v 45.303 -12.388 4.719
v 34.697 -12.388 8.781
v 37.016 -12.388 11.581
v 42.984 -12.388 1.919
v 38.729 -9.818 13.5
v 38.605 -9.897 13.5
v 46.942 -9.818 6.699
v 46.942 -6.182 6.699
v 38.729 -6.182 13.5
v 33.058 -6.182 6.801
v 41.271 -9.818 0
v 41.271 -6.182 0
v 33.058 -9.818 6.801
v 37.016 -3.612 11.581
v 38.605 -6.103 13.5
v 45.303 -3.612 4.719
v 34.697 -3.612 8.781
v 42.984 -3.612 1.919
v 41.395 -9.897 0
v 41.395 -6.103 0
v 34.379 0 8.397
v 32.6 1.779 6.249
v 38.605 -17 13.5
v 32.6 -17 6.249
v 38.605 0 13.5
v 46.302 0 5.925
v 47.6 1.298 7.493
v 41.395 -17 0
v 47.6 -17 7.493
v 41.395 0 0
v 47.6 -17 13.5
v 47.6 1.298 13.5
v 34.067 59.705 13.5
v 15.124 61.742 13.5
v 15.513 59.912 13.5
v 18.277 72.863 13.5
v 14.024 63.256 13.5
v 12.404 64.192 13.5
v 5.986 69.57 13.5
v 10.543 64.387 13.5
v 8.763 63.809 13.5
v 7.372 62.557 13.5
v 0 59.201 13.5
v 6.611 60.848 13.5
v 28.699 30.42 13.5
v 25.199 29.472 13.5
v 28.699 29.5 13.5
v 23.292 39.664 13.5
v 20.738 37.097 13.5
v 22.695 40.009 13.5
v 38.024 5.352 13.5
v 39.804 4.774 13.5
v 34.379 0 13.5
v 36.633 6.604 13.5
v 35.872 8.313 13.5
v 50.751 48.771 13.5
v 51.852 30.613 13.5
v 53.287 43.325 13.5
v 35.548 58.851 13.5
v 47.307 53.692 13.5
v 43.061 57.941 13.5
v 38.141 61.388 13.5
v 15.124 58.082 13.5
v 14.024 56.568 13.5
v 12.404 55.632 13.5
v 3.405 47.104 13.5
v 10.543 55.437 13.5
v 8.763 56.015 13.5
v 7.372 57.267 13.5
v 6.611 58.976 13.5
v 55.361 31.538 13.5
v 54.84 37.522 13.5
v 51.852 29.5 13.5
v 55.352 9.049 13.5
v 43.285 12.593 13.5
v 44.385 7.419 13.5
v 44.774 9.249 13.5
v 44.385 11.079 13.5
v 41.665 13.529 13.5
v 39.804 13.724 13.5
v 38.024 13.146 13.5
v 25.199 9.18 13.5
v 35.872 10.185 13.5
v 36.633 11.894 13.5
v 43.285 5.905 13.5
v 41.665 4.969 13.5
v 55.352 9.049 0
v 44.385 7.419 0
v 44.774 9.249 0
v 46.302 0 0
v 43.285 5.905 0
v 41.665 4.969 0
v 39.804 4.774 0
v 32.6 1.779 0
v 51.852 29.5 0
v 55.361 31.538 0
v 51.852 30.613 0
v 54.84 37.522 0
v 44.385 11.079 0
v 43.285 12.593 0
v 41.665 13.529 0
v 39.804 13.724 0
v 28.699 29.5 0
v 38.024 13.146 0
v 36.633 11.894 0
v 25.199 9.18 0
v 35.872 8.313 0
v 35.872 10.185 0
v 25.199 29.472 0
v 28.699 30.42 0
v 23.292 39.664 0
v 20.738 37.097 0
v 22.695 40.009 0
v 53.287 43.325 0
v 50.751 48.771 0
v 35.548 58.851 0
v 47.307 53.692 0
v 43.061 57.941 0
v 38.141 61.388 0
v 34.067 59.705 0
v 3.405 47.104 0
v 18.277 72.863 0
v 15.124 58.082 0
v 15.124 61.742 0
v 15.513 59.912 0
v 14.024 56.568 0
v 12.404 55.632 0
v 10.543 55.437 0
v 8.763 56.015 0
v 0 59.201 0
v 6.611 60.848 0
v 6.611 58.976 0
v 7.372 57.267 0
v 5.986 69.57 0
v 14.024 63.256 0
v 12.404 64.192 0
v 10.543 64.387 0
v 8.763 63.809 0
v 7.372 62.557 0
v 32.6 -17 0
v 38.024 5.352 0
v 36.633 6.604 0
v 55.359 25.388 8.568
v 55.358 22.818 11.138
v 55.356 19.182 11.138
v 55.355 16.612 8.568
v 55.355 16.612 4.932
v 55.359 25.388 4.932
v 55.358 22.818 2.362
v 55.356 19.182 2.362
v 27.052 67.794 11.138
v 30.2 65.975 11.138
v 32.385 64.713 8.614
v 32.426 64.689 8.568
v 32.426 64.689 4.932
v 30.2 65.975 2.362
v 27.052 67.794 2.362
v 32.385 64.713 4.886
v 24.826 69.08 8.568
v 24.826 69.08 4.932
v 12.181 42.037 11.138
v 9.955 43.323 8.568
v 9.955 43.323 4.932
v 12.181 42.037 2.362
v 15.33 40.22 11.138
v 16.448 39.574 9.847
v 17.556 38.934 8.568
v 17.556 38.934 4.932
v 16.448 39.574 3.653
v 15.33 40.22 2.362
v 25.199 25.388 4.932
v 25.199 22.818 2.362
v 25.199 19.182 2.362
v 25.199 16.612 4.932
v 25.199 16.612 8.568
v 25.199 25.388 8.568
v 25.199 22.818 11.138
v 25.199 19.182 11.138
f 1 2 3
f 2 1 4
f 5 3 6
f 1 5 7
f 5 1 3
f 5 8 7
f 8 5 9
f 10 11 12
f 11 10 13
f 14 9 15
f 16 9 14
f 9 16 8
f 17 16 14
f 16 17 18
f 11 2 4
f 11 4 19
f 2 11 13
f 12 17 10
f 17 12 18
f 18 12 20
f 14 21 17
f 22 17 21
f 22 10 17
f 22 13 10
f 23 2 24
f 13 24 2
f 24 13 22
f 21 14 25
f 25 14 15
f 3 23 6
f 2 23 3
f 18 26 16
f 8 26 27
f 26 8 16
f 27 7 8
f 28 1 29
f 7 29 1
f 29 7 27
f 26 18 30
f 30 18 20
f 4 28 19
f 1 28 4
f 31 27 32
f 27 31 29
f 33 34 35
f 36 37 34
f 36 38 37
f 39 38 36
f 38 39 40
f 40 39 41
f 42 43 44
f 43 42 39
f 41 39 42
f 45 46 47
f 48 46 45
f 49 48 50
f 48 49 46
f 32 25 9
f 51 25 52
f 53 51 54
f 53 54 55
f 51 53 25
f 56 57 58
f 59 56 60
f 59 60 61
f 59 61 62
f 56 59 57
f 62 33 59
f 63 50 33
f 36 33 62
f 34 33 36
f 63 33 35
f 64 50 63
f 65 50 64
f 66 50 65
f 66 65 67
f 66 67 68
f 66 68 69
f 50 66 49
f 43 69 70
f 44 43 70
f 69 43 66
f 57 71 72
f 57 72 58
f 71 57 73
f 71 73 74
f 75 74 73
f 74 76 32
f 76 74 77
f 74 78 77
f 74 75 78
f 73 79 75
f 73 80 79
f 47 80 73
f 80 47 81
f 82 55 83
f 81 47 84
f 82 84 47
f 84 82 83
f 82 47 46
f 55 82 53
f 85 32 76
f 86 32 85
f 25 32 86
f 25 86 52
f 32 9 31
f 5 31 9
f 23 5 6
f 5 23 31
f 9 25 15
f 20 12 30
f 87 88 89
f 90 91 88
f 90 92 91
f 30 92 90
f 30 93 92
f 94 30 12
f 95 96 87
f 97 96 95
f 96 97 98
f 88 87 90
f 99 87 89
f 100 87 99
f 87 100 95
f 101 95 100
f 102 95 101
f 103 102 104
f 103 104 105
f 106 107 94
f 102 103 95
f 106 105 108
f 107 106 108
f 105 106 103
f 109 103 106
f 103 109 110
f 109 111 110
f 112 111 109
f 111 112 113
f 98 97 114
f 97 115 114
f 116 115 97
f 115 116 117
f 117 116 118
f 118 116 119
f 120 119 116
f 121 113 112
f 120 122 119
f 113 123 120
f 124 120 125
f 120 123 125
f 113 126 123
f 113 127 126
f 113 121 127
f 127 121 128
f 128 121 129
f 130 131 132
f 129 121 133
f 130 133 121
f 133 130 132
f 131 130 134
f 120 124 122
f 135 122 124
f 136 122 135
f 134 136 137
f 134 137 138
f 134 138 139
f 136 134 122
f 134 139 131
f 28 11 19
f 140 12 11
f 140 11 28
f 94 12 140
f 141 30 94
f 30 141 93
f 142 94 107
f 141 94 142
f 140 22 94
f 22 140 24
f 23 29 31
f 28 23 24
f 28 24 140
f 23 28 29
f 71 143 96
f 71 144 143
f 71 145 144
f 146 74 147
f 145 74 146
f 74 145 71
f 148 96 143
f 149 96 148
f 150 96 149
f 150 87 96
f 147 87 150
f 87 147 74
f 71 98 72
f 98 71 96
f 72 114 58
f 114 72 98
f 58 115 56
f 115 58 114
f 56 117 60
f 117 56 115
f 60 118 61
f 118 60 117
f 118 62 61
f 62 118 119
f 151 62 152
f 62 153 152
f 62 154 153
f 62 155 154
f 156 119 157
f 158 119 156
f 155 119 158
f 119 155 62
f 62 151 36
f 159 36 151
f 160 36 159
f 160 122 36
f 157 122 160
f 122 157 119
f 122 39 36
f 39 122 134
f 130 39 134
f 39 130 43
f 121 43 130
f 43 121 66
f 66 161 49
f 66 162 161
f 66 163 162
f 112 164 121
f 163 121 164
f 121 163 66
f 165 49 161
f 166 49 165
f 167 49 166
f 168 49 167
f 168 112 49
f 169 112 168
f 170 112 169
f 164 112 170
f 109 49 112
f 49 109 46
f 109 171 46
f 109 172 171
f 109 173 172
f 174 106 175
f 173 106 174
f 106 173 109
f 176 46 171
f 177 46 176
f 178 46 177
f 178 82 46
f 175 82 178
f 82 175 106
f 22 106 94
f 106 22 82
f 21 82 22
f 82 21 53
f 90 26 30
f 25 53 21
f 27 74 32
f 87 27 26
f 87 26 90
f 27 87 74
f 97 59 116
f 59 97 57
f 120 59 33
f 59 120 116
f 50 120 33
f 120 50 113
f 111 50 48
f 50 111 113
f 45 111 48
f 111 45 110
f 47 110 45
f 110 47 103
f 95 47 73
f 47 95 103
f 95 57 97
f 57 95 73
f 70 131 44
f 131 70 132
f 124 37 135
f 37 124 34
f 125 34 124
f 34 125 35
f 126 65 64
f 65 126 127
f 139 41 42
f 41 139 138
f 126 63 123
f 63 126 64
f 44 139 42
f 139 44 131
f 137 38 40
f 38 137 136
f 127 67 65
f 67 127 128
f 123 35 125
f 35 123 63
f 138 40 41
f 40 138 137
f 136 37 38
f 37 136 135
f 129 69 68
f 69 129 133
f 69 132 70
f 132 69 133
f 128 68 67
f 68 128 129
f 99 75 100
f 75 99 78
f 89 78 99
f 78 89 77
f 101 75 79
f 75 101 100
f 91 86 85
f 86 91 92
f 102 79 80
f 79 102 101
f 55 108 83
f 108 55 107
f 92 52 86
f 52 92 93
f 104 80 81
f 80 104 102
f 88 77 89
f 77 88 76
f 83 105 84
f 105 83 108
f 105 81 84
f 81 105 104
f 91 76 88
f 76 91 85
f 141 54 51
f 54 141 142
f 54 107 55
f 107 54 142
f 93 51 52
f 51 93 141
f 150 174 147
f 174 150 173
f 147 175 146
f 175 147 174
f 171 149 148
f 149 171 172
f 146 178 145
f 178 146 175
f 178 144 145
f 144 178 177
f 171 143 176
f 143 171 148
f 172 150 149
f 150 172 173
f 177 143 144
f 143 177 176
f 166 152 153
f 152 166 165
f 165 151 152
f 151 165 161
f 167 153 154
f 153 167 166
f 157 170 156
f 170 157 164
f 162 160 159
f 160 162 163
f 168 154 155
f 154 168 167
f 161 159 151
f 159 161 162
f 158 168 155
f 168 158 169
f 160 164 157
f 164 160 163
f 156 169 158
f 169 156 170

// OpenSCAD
// file: functions.scad
// PRUSA Mendel  
// Functions used in many files
// GNU GPL v3
// Josef Průša
// josefprusa@me.com
// prusadjs.cz
// http://www.reprap.org/wiki/Prusa_Mendel
// http://github.com/prusajr/PrusaMendel


module nut(d,h,horizontal=true){
cornerdiameter =  (d / 2) / cos (180 / 6);
cylinder(h = h, r = cornerdiameter, $fn = 6);
if(horizontal){
for(i = [1:6]){
	rotate([0,0,60*i]) translate([-cornerdiameter-0.2,0,0]) rotate([0,0,-45]) cube(size = [2,2,h]);
}}
}

// Based on nophead research
module polyhole(d,h) {
    n = max(round(2 * d),3);
    rotate([0,0,180])
        cylinder(h = h, r = (d / 2) / cos (180 / n), $fn = n);
}




module roundcorner(diameter){
	difference(){
		cube(size = [diameter,diameter,99], center = false);
		translate(v = [diameter, diameter, 0]) cylinder(h = 100, r=diameter, center=false,$fn = max(3*diameter,20));
	}
}
// file: configuration.scad
// PRUSA Mendel  
// Configuration file
// GNU GPL v2
// Josef Pra
// josefprusa@me.com
// prusadjs.cz
// http://www.reprap.org/wiki/Prusa_Mendel
// http://github.com/prusajr/PrusaMendel


// PLEASE SELECT ONE OF THE CONFIGURATIONS BELOW
// BY UN-COMMENTING IT


variant=0; //0 for metric
//variant=1; //1 for SAE
if(variant==0){
echo("variant: metric");
}else if(variant==1){
echo("variant: sae");
} else{
echo("WARNING: INVALID CONFIGURATION");
}




vars=[
//[m8_dia,m8_nut, m4_dia, m4_nut, m3_dia, m3_nut, bush_dia, mot_shaft, bush_rod, bush_outerdia, bush_length, m5_dia, m5_nut]
[9, 16.4, 5,9, 4.4, 7, 11, 5.3, 8, 16, 11, 5.6, 10],//metric
[9,15.7,5.5,10.6,5.5,10.6,11.5,5.3,7.9375,16,11,5.6, 10]//SAE
];


//BUSHING TYPE Can generate three versions
// 1 - regular old ones
// 2 - helical ones
// 3 - holders for brass or any other bought bushings
bushing_type = 2;


//Round corner diameter
round_corner_diameter = 8;


//Thin wall size
layer_height = 0.4;
perimeter_width_over_thicknes = 1.6;
infill_widht_over_thickness = 1.55;
thin_wall = 2*(perimeter_width_over_thicknes*layer_height+infill_widht_over_thickness*layer_height);
if(thin_wall<2){
	echo("Check thin wall size, its below 2mm!");
}
echo(thin_wall);


//DO NOT TOUCH THIS SECTION!
m8_diameter = vars[variant][0];
m8_nut_diameter = vars[variant][1];
m4_diameter = vars[variant][2];
m4_nut_diameter = vars[variant][3];
m3_diameter = vars[variant][4];
m3_nut_diameter = vars[variant][5];
bushing_diameter = vars[variant][6];
motor_shaft=vars[variant][7];
bushing_rodsize = vars[variant][8];
bushing_outerDiameter = vars[variant][9];
bushing_lenght = vars[variant][10];
m5_diameter = vars[variant][11];
m5_nut_diameter = vars[variant][12];



// MINI-HUXLEY VERSION (TODO, just place holder)
// include <configuration-huxley.scad>


// MEGA VERSION (TODO, just place holder)
// include <configuration-mega.scad>

// Gap between the X rods

x_rod_centres=70;


// Some basic functions, probably should be somewhere else
module roundcorner(diameter){
	difference(){
		cube(size = [diameter,diameter,99], center = false);
		translate(v = [diameter, diameter, 0]) cylinder(h = 100, r=diameter, center=true);
	}
}

include <functions.scad>
// main file
// PRUSA Mendel  
// Frame vertex
// GNU GPL v2
// Josef Průša
// josefprusa@me.com
// prusadjs.cz
// http://www.reprap.org/wiki/Prusa_Mendel
// http://github.com/prusajr/PrusaMendel

// Based on http://www.thingiverse.com/thing:2003 aka Viks footed 
// frame vertex, which is based on http://www.thingiverse.com/thing:1780 
// aka Tonokps parametric frame vertex
// Thank you guys for your great work

// Modified by Adrian to remove material from the middle and to add
// the option of a diagonal between the feet.

include <configuration.scad>

// Print 4 with basefoot true plus 2 with basefoot false

basefoot=true;
drill_diag=true;



m8_horizontal=m8_diameter+0.5;
vfvertex_height=m8_horizontal+4;

// Distance between feet used to calculate diagonal angle

xfeet = 265;
yfeet = 320;

diagonal=atan2(xfeet,yfeet);
diag_y = 7;


/**
 *@name Frame vertex
 *@using 8 m8nut
 *@using 8 m8washer
 */
module vertex(with_foot=basefoot){


translate ([0,0,vfvertex_height/2])difference() 
{
	union () {
		dxf_linear_extrude(file = "../dxf/vertex-body-fixed-qcad.dxf",height=vfvertex_height,center=true);
		//import_stl("vertex-body-fixed.stl");
		if (with_foot) {
			translate([40,-15,0]) vertex_foot();
		}
	}

	dxf_linear_extrude(file = "../dxf/vertex-body-hole-qcad.dxf",height=2*vfvertex_height,center=true);

	translate([11.013,59.912]) cylinder(h=18,r=(m8_diameter/2),center=true); 
	translate([40.274,9.249,0]) cylinder(h=18,r=(m8_diameter/2),center=true); 
	translate([40,21,0])
		xteardrop(m8_horizontal,62);
	translate([13.687,41.010,0]) rotate(a=60,v=[0,0,1])
		xteardrop(m8_horizontal,62);
}
}
vertex(basefoot);



module xteardrop(diameter,length) rotate(a=-90,v=[0,1,0]) rotate(a=-90,v=[0,0,1]) zteardrop(diameter,length);

module yteardrop(diameter,length) rotate(a=90,v=[1,0,0]) zteardrop(diameter,length);

module zteardrop(diameter,height)
{
	rotate(a=0, v=[0,0,1]) union()
	{
		//translate([0,0,-height/2]) cube(size=[diameter/2,diameter/2,height],center=false);
		rotate(a=22.5, v=[0,0,1])cylinder(r=diameter/2, h = height,center=true,$fn=8);
	}
}


module vertex_foot() {
	difference () {
		union () {
			translate ([0.1,8,0]) cube([15,20,vfvertex_height],center=true);
		}
		if(drill_diag)
		{
			translate ([0,diag_y,0]) 
				rotate([0,diagonal,0])
					xteardrop(m8_horizontal,62);
			translate ([-15,diag_y,6]) 
				rotate([0,diagonal,0])
					cube([20,20,20],center=true);
			translate ([15,diag_y,-6]) 
				rotate([0,diagonal,0])
					cube([20,20,20],center=true);
		}
	}
}
